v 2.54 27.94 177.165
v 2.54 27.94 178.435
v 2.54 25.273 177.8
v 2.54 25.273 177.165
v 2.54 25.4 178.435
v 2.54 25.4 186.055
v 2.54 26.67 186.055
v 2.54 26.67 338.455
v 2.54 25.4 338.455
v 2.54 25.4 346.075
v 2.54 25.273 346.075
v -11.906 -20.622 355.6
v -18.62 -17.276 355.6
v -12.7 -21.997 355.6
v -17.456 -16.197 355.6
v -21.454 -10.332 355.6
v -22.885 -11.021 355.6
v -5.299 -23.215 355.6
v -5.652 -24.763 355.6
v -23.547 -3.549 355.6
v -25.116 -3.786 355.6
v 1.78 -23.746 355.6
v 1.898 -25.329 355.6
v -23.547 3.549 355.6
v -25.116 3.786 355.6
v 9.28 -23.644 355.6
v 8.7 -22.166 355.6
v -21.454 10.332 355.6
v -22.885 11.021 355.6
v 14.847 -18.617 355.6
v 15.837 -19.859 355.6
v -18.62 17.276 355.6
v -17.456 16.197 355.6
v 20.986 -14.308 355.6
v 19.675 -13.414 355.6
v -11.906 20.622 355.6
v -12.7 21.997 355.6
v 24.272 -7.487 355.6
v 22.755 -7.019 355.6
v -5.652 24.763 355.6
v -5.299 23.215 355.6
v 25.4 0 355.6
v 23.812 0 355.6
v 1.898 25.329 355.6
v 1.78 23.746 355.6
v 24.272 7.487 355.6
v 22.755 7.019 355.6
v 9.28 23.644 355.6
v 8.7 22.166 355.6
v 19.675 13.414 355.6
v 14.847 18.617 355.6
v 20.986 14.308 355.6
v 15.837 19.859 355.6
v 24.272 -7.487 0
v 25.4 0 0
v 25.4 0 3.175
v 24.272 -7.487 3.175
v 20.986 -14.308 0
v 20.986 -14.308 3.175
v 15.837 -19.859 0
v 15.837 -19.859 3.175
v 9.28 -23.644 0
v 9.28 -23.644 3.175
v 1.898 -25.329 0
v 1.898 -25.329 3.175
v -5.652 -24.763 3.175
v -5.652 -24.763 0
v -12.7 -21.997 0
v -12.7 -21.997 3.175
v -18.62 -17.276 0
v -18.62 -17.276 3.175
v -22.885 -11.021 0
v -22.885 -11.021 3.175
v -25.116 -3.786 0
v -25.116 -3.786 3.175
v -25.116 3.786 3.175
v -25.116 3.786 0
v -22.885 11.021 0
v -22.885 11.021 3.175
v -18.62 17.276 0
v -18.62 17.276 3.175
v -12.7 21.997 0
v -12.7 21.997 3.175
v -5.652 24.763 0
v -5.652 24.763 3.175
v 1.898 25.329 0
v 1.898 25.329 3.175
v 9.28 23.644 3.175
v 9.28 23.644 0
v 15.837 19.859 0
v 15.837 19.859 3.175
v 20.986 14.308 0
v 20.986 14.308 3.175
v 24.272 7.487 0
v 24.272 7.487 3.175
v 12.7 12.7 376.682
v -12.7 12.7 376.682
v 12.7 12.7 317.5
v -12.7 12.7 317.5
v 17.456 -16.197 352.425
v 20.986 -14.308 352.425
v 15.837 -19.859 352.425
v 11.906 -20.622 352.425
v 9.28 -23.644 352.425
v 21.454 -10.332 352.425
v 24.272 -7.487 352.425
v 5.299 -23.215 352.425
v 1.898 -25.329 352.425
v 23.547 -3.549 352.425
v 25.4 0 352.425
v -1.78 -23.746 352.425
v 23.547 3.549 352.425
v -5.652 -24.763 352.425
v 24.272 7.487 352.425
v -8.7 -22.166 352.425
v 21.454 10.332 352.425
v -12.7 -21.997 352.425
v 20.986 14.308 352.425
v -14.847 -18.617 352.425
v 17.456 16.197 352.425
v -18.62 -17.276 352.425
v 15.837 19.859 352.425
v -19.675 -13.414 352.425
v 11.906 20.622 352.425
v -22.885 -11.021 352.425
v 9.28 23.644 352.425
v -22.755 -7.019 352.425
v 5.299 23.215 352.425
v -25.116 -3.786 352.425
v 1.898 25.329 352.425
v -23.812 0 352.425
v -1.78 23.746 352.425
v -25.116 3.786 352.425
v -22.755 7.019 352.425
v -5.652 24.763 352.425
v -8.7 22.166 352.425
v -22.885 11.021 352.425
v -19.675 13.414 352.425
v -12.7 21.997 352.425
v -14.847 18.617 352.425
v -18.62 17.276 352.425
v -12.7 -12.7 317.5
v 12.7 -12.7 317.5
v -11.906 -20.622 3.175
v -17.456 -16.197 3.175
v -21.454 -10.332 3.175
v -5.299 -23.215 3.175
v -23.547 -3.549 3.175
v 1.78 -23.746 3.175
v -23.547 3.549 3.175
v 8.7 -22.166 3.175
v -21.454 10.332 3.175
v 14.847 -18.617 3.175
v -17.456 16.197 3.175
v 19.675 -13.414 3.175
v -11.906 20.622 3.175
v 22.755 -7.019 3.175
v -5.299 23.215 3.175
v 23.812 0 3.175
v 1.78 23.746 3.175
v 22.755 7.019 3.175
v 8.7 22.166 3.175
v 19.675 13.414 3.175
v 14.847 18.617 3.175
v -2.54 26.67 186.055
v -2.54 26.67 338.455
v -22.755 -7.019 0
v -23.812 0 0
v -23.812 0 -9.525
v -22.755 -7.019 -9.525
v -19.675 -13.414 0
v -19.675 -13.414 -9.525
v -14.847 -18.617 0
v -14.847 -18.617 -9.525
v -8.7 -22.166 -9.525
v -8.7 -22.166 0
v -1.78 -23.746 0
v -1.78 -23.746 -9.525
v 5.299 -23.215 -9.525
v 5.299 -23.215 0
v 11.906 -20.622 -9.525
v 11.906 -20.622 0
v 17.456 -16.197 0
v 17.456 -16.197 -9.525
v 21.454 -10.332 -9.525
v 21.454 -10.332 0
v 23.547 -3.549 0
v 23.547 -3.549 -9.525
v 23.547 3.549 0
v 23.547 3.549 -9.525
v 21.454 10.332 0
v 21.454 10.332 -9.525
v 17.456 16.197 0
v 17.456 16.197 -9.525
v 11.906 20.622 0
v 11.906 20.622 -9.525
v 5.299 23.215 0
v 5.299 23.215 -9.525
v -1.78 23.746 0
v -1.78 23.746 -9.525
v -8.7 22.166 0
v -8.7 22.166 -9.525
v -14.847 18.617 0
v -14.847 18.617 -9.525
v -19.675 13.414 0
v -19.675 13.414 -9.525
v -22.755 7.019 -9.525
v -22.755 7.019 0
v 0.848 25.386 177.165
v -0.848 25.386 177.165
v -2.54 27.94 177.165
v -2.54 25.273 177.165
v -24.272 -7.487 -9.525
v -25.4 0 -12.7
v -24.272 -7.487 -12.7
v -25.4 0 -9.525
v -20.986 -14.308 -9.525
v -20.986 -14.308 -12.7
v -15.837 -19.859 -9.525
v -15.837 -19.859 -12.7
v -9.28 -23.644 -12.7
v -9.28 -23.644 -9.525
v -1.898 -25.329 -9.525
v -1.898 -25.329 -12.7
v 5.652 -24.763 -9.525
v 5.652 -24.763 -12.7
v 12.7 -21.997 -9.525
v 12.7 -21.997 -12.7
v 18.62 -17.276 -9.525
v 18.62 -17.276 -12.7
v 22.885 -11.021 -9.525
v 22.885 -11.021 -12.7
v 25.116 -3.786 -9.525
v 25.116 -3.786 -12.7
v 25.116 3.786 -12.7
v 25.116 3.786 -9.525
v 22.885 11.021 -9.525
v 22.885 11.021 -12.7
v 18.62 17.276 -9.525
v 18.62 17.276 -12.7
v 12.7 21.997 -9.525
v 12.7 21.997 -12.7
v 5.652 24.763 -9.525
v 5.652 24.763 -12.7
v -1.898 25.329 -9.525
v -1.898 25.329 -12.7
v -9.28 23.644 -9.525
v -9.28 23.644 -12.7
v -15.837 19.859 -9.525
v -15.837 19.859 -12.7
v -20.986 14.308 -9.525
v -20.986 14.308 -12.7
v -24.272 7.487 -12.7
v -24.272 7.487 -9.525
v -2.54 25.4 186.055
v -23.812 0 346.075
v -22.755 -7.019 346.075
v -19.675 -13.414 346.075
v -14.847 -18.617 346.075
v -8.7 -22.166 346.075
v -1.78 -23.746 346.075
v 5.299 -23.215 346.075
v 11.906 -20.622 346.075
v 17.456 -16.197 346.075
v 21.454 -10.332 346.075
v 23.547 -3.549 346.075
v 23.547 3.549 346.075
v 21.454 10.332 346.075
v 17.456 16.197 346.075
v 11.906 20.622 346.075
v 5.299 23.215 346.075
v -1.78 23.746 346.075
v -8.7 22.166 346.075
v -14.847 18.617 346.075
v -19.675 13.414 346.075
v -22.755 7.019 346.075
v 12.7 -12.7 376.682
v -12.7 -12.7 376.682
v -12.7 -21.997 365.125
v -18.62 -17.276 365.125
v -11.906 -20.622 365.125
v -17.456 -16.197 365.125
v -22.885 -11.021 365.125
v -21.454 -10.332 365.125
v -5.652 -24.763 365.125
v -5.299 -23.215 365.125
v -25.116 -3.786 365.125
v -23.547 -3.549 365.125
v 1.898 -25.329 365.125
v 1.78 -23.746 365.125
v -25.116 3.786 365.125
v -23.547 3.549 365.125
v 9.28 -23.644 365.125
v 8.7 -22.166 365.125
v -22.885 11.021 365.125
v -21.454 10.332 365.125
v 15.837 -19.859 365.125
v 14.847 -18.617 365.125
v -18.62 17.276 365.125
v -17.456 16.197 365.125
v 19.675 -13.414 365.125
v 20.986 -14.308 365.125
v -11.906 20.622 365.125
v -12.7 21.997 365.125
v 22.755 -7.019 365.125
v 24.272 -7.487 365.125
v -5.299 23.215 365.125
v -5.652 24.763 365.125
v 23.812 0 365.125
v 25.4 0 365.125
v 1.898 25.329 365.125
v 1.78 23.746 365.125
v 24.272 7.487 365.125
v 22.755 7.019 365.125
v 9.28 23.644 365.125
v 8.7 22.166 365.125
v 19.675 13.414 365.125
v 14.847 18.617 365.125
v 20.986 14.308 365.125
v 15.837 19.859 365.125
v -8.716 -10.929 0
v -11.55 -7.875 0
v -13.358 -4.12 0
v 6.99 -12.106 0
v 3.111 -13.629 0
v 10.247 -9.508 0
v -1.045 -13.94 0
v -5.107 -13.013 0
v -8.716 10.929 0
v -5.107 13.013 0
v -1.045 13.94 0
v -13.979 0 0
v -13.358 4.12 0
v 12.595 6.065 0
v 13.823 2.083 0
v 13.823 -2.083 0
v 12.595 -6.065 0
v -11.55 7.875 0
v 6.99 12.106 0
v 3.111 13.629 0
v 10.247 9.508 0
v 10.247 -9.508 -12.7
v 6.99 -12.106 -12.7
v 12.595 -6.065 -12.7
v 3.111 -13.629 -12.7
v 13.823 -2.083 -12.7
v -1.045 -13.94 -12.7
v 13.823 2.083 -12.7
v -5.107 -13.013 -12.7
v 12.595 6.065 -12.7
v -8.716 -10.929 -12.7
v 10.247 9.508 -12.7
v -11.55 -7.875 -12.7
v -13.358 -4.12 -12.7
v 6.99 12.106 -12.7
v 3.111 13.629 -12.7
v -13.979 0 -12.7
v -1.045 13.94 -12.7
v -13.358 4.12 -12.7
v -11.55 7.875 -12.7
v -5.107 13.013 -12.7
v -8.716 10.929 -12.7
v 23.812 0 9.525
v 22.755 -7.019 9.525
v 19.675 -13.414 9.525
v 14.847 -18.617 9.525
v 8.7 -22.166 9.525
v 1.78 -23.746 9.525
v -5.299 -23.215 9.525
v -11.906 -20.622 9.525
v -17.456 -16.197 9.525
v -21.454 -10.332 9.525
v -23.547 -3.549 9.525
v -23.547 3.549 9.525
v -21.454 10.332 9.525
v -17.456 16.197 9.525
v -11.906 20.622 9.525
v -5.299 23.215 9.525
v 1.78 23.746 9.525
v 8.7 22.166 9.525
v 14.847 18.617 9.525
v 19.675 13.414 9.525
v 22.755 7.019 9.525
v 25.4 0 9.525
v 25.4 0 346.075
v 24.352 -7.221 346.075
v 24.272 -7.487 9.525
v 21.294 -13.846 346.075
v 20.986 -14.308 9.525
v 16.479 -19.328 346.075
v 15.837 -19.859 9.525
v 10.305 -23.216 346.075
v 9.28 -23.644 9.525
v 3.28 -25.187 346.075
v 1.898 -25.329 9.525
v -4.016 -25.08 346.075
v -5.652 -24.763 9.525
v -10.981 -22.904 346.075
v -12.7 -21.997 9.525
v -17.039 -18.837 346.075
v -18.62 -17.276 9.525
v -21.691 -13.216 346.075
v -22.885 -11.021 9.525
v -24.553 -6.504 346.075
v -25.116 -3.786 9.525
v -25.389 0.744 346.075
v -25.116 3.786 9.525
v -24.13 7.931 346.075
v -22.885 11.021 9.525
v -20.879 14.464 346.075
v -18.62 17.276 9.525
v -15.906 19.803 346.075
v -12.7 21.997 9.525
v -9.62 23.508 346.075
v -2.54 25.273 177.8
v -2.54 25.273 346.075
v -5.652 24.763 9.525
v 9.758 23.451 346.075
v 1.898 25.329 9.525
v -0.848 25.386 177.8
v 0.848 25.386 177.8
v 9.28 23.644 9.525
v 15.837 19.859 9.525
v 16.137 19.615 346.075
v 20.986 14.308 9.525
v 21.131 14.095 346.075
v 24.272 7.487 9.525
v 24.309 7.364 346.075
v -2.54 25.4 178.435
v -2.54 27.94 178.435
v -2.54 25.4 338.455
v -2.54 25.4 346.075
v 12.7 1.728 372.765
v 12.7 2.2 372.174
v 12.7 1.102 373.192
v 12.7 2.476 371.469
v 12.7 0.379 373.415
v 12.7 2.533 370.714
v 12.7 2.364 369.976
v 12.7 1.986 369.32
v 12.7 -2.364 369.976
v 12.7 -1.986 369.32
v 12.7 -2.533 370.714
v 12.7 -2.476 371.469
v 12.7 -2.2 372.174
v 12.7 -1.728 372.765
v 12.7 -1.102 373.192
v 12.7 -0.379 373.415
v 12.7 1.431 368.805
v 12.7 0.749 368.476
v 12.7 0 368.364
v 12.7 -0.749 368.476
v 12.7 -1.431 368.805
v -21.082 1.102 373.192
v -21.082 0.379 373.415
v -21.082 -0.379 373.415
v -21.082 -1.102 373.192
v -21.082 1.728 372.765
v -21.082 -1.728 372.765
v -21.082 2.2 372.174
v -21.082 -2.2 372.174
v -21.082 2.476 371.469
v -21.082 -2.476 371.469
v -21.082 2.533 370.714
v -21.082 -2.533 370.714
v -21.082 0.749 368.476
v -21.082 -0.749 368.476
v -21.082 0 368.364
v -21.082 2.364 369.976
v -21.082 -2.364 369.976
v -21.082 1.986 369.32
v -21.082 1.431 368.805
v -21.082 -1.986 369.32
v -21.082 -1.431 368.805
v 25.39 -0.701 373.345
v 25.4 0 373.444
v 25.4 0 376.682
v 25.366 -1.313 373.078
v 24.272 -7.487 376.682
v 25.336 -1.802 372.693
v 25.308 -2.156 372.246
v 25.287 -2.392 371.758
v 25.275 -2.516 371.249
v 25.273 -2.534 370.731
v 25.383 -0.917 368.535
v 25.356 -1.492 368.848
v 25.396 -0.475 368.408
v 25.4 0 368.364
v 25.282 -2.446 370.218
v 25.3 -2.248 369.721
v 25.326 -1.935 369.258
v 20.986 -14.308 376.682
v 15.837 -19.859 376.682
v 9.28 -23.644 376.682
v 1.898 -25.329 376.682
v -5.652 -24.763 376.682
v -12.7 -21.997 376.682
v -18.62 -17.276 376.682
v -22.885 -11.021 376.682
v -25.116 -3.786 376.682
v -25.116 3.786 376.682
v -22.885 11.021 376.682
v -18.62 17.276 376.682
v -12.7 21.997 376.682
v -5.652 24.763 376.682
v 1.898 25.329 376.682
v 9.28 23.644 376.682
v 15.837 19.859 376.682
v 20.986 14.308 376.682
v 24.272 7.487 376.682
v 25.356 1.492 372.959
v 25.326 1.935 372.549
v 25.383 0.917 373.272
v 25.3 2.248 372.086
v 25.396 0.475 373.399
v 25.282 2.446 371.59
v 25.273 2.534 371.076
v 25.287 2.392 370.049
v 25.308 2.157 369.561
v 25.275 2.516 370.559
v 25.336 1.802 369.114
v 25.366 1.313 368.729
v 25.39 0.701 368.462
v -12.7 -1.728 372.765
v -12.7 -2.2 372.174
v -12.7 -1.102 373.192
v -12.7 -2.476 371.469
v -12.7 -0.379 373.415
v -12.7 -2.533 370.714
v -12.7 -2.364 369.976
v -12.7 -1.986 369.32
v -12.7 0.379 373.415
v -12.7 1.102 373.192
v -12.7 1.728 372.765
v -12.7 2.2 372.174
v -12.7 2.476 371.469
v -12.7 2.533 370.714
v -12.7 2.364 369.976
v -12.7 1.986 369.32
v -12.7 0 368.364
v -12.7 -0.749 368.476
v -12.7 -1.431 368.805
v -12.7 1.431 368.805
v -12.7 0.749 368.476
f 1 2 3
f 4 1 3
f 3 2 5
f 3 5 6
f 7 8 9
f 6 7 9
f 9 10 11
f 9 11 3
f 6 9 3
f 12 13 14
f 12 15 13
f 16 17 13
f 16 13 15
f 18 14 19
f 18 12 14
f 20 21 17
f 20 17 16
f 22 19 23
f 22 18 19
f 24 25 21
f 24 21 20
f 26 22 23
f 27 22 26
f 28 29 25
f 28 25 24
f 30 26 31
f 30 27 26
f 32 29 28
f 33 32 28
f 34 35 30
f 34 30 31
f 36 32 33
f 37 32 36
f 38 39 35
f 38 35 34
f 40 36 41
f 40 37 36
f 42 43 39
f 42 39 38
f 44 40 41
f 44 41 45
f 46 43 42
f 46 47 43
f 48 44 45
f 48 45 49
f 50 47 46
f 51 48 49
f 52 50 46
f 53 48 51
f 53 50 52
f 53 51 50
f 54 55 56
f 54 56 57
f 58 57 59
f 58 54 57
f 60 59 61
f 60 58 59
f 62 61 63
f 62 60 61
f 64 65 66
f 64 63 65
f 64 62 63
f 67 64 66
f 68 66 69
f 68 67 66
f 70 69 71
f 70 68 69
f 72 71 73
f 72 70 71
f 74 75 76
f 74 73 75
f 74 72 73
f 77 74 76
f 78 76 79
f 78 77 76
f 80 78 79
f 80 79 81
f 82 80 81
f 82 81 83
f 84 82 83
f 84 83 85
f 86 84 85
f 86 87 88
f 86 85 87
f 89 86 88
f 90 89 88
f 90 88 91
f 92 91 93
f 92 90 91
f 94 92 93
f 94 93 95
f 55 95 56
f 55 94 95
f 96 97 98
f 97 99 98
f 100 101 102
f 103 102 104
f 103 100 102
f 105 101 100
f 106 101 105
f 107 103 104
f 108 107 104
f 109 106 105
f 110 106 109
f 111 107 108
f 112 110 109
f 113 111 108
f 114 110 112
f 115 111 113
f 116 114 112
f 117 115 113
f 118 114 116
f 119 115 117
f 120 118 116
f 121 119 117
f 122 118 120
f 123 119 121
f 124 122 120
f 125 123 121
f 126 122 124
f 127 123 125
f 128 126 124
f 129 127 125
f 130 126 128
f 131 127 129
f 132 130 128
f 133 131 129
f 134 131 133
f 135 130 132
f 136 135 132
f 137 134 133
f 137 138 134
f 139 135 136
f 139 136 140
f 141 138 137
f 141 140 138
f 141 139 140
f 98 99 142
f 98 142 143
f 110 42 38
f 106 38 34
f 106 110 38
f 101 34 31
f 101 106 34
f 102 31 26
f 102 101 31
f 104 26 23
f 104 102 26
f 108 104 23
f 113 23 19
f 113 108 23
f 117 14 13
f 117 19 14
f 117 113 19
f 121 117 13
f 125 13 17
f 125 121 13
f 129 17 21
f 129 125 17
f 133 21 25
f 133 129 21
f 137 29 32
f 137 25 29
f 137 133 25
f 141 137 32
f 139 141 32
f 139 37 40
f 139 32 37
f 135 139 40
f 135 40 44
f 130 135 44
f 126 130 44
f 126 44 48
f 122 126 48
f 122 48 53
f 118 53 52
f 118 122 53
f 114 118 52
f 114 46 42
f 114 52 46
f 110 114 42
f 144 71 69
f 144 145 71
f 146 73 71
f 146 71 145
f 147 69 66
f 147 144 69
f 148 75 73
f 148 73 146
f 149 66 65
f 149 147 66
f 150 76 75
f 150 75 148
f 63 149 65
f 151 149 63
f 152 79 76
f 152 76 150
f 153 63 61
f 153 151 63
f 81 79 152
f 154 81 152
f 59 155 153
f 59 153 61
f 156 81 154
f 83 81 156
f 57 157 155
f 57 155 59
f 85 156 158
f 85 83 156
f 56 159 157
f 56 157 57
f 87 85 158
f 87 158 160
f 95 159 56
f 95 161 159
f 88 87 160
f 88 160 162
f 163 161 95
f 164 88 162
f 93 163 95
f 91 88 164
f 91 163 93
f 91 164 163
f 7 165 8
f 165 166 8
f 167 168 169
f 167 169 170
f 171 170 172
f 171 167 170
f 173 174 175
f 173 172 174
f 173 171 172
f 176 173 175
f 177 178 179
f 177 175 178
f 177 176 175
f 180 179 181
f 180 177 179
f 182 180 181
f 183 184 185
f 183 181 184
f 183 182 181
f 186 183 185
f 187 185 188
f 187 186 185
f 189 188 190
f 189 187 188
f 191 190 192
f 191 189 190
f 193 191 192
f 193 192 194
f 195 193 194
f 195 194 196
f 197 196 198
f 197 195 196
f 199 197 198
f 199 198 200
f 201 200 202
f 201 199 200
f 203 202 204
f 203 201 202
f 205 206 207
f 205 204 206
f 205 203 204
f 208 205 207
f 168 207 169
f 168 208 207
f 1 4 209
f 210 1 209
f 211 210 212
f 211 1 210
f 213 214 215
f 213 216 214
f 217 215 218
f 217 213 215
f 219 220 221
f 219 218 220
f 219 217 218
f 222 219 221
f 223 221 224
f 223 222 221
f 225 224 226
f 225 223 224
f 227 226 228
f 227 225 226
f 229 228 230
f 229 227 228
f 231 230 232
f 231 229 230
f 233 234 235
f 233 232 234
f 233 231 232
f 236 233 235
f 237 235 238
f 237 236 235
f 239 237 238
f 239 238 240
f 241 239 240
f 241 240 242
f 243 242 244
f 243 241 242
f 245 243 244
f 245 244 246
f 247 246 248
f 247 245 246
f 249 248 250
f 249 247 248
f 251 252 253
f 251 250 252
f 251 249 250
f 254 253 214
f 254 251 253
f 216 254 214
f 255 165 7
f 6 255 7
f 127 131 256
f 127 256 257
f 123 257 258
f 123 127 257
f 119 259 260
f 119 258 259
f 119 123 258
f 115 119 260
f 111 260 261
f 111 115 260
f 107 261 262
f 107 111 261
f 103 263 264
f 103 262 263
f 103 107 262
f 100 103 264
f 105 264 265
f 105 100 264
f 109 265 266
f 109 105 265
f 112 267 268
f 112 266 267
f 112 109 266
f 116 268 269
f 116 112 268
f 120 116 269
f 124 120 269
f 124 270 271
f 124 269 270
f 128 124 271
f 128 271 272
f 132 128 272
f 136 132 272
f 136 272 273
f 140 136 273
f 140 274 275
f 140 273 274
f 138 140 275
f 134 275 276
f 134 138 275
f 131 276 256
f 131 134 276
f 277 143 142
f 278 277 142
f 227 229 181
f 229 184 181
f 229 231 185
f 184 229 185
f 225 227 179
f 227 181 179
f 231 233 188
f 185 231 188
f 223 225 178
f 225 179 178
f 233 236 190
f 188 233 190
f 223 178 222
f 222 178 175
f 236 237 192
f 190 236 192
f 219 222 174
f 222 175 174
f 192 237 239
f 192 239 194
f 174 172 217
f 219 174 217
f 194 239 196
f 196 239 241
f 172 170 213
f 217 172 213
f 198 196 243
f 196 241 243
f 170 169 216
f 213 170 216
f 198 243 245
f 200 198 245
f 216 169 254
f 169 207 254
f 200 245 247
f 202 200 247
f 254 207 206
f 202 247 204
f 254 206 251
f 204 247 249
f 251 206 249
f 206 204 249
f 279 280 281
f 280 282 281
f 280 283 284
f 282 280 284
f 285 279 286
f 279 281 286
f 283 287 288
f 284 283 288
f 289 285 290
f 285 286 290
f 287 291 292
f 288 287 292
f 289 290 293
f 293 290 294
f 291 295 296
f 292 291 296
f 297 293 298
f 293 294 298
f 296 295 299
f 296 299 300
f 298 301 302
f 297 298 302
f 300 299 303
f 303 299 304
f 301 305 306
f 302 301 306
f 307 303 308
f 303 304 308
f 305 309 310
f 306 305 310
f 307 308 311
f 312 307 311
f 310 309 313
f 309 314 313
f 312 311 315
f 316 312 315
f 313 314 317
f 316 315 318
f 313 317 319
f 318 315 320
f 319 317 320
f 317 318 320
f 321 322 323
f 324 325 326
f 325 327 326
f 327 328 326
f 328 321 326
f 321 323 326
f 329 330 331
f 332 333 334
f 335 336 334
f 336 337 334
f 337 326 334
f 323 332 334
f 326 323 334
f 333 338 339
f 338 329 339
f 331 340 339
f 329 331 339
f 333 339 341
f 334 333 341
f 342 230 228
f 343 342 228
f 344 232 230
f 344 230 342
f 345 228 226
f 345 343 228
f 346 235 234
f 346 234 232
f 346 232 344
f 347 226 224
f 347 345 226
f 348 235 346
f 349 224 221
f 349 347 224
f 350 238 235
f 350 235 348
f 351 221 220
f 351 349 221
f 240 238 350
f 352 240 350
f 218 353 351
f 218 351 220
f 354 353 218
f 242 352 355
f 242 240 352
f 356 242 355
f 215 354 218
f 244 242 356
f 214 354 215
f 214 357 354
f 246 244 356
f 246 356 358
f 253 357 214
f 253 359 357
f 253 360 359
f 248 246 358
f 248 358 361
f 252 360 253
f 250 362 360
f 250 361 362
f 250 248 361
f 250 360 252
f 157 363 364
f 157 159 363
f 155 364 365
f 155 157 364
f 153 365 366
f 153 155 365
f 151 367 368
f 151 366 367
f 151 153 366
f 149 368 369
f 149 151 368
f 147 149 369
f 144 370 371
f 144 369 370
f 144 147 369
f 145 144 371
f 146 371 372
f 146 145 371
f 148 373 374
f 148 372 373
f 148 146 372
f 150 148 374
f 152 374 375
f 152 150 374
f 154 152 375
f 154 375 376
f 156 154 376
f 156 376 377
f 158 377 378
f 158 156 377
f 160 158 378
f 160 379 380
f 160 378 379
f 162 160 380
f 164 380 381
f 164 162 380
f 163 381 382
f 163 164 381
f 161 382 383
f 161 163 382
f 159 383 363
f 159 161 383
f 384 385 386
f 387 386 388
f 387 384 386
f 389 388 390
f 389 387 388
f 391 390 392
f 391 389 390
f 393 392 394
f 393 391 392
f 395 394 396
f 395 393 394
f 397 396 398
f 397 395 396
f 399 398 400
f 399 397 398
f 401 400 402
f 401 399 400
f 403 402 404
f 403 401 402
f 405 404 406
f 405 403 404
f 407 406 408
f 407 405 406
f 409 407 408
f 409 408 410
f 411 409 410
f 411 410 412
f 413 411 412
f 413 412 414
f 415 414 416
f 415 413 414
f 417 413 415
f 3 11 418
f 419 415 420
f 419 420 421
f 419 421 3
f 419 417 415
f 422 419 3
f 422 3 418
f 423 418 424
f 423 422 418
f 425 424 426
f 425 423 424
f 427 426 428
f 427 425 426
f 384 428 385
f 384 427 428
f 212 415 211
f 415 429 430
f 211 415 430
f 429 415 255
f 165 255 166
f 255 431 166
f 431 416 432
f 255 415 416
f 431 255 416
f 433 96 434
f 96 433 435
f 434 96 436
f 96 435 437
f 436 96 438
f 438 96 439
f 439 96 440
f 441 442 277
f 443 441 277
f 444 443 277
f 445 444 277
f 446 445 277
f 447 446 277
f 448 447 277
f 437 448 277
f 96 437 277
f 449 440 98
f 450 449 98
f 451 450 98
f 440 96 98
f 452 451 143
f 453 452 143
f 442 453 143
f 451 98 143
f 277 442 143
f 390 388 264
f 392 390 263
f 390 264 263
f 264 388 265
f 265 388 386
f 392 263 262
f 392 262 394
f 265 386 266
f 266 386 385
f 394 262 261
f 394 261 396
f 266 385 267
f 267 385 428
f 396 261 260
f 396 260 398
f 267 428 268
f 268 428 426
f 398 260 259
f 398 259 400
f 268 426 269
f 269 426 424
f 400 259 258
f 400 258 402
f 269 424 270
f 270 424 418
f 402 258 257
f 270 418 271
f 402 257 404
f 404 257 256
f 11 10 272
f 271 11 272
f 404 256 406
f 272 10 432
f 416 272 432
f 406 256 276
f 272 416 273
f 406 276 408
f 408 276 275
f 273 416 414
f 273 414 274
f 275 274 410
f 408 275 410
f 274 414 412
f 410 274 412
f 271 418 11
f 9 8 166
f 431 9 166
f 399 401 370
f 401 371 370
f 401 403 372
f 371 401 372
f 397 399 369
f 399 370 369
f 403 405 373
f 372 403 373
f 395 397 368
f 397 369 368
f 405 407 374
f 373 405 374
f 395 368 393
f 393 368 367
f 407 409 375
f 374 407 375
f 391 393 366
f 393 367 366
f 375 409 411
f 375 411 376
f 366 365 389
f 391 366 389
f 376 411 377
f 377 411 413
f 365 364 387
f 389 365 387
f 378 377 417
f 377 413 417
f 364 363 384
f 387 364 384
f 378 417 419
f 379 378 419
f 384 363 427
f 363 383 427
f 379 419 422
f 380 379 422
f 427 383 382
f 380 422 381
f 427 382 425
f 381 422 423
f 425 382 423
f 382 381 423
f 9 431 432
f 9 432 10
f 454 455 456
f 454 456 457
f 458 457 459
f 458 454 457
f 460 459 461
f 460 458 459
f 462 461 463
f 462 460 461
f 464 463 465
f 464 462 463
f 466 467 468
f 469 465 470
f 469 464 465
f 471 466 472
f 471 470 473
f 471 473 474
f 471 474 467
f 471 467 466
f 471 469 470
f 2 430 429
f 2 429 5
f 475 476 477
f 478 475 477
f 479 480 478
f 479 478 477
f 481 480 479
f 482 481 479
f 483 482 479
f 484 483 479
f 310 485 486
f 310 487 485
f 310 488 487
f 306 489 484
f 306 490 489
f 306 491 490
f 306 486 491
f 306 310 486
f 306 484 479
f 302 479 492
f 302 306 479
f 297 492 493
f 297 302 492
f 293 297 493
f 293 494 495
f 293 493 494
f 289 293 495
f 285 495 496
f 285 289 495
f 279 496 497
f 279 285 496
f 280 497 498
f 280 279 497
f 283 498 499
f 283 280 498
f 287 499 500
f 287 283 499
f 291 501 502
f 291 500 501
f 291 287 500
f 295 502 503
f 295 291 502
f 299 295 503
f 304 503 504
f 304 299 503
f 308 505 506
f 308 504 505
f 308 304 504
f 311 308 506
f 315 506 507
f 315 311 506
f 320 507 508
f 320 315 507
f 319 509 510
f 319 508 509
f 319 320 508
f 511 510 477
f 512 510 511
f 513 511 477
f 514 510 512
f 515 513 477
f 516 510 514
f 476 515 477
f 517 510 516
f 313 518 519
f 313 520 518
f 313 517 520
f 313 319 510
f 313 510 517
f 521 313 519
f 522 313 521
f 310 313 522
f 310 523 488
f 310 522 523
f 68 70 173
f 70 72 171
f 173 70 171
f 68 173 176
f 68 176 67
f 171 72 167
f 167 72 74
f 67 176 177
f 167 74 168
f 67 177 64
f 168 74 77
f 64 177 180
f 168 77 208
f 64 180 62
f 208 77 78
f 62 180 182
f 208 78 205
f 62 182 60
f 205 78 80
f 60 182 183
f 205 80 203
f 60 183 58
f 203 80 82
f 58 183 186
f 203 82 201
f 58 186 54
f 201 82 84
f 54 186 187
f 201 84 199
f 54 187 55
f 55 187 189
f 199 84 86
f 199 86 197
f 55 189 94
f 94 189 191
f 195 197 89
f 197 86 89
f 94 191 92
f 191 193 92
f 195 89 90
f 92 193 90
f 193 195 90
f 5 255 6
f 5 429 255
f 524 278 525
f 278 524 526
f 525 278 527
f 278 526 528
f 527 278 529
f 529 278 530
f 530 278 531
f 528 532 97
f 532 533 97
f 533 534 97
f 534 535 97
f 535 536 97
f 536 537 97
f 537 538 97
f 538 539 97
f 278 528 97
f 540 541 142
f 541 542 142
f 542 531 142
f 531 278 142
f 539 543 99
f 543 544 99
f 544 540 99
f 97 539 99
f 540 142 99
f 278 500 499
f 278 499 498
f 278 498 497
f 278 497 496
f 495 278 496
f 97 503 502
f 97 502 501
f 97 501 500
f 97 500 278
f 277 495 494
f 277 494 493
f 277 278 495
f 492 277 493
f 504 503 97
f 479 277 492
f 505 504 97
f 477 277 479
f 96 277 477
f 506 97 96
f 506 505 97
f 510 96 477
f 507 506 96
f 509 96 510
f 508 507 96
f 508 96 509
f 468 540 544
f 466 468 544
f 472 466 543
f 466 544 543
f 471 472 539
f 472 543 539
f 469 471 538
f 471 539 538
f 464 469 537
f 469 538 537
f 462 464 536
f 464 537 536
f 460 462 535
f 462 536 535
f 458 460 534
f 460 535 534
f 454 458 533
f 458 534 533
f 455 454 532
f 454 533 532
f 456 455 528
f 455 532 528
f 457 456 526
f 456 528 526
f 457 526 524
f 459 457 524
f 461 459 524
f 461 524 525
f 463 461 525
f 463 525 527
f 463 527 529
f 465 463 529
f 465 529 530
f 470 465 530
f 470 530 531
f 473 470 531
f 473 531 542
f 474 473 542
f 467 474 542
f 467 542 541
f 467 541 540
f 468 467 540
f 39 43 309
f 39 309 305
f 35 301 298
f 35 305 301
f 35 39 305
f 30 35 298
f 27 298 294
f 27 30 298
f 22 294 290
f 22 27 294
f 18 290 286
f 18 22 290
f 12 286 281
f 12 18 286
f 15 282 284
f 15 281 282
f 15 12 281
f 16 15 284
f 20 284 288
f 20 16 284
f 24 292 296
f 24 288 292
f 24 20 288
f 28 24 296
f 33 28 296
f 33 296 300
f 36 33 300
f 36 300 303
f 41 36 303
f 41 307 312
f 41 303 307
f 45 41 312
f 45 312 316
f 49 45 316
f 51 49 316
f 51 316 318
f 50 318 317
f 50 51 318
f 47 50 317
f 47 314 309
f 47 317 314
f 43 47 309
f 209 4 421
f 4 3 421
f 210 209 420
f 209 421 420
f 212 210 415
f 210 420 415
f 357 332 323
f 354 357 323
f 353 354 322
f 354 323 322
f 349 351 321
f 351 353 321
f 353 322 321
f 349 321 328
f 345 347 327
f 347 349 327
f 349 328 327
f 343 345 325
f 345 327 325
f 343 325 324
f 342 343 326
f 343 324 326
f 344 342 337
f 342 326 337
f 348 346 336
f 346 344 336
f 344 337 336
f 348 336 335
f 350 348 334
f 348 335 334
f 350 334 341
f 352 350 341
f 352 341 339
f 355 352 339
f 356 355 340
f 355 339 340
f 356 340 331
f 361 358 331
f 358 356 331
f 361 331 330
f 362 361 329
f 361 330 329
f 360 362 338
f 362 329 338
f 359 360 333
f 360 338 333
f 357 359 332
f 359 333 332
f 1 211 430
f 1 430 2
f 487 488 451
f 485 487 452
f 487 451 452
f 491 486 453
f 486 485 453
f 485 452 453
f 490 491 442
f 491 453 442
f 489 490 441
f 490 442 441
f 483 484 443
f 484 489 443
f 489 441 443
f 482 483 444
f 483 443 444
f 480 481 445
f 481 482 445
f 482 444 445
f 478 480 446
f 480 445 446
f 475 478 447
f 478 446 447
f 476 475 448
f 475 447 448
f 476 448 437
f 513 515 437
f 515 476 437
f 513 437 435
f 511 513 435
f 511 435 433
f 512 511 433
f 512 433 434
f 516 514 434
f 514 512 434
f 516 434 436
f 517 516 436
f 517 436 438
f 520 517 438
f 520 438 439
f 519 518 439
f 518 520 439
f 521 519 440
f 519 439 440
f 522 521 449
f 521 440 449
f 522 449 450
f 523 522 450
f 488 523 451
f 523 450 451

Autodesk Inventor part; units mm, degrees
ref_plane "YZ Plane" through (0, 0, 0) normal (1, 0, 0) x (0, 1, 0)
ref_plane "XZ Plane" through (0, 0, 0) normal (0, 1, 0) x (-1, 0, 0)
ref_plane "XY Plane" through (0, 0, 0) normal (0, 0, 1) x (1, 0, 0)
sketch "Sketch1" plane through (0, 0, 0) normal (0, 0, 1) x (1, 0, 0)
  circle A0 centre (0, 0) radius 25.4
  dimension "d0" = 50.8
extrude "Extrusion1" add sketch "Sketch1" along normal blind 355.6
sketch "Sketch4" plane through (0, 0, 355.6) normal (0, 0, 1) x (1, 0, 0)
  line L0 (31.0854, 16.4706) -> (47.788, 16.4706)
  line L1 (47.788, 16.4706) -> (47.788, 0)
  line L2 (47.788, 0) -> (31.0854, 0)
  line L3 (31.0854, 0) -> (31.0854, 16.4706)
  point P0 (0, 0)
extrude "Extrusion4" add sketch "Sketch4" against normal blind 3.175
sketch "Sketch5" plane through (0, 0, 352.425) normal (0, 0, -1) x (-1, 0, 0)
  circle A0 centre (0, 0) radius 25.4
  circle A1 centre (0, 0) radius 23.8125
  dimension "d19" = 1.5875
extrude "Extrusion5" cut sketch "Sketch5" along normal blind 6.35
sketch "Sketch6" plane through (0, 0, 0) normal (0, 0, -1) x (-1, 0, 0)
  line L0 (29.0417, -43.641) -> (10.5178, -43.641)
  line L1 (10.5178, -43.641) -> (10.5178, -69.3861)
  line L2 (10.5178, -69.3861) -> (29.0417, -69.3861)
  line L3 (29.0417, -69.3861) -> (29.0417, -43.641)
  point P0 (0, 0)
extrude "Extrusion6" add sketch "Sketch6" against normal blind 3.175
sketch "Sketch7" plane through (0, 0, 3.175) normal (0, 0, 1) x (1, 0, 0)
  circle A0 centre (0, 0) radius 25.4
  circle A1 centre (0, 0) radius 23.8125
extrude "Extrusion7" cut sketch "Sketch7" along normal blind 6.35
sketch "Sketch8" plane through (-29.0417, -69.3861, 0) normal (-1, 0, 0) x (0, 0, 1)
  line L0 (0, 0) -> (0, 25.7451) projected
  line L1 (3.175, 25.7451) -> (3.175, 0) projected
  line L2 (0, 0) -> (3.175, 0)
  line L3 (3.175, 0) -> (3.175, 25.7451)
  line L4 (3.175, 25.7451) -> (0, 25.7451)
  line L5 (0, 25.7451) -> (0, 0)
  point P0 (0, 69.3861)
extrude "Extrusion8" cut sketch "Sketch8" against normal through all
sketch "Sketch9" plane through (0, 0, 355.6) normal (0, 0, 1) x (1, 0, 0)
  line L0 (31.0854, 16.4706) -> (47.788, 16.4706) projected
  line L1 (31.0854, 16.4706) -> (47.788, 16.4706)
  line L2 (47.788, 16.4706) -> (47.788, 0)
  line L3 (47.788, 0) -> (31.0854, 0)
  line L4 (31.0854, 0) -> (31.0854, 16.4706)
  point P0 (0, 0)
extrude "Extrusion9" cut sketch "Sketch9" against normal blind 6.35
sketch "Sketch10" plane through (0, 0, 346.075) normal (0, 0, 1) x (1, 0, 0)
  circle A0 centre (0, 0) radius 25.4 projected
  line L0 (2.54, 25.4) -> (2.54, 26.67)
  line L1 (2.54, 26.67) -> (0, 26.67)
  line L2 (0, 26.67) -> (0, 25.4)
  line L3 (-2.54, 25.4) -> (-2.54, 26.67)
  line L4 (-2.54, 26.67) -> (0, 26.67)
  line L5 (0, 26.67) -> (0, 25.4)
  arc A1 (2.54, 25.2727) -> (-2.54, 25.2727) centre (0, 0) ccw
  line L6 (2.54, 25.4) -> (2.54, 25.2727)
  line L7 (-2.54, 25.4) -> (-2.54, 25.2727)
  dimension "d30" = 2.54
  dimension "d31" = 1.27
  dimension "d32" = 2.54
  dimension "d33" = 1.27
extrude "Extrusion10" add sketch "Sketch10" against normal blind 168.275 contours A0 L2 L1 L0 L6 | L7 L3 L4 L2 A0
sketch "Sketch11" plane through (-2.54, 26.67, 346.075) normal (0, 1, 0) x (1, 0, 0)
  line L0 (5.08, 168.275) -> (0, 168.275) projected
  line L1 (0, 0) -> (0, 168.275) projected
  line L2 (5.08, 168.275) -> (0, 168.275)
  line L3 (0, 168.275) -> (0, 167.64)
  line L4 (0, 167.64) -> (5.08, 167.64)
  line L5 (5.08, 167.64) -> (5.08, 168.275)
  line L6 (5.08, 168.275) -> (0, 168.275)
  line L7 (0, 168.275) -> (0, 168.91)
  line L8 (0, 168.91) -> (5.08, 168.91)
  line L9 (5.08, 168.91) -> (5.08, 168.275)
  point P0 (2.54, 346.075)
  dimension "d36" = 0.635
  dimension "d37" = 0.635
sketch "Sketch12" plane through (0, 0, 177.8) normal (0, 0, -1) x (-1, 0, 0)
  line L0 (2.54, 26.67) -> (-2.54, 26.67) projected
  line L1 (-2.54, 26.67) -> (-2.54, 25.2727)
  line L2 (-2.54, 25.2727) -> (2.54, 25.2727)
  line L3 (2.54, 25.2727) -> (2.54, 26.67) projected
  line L4 (2.54, 26.67) -> (2.54, 25.2727)
  line L5 (-2.54, 26.67) -> (2.54, 26.67)
  arc A0 (2.54, 25.2727) -> (-2.54, 25.2727) centre (0, 0) ccw
  arc A1 (-2.54, 25.2727) -> (2.54, 25.2727) centre (0, 0) ccw projected
  arc A2 (2.54, 25.2727) -> (-2.54, 25.2727) centre (0, 0) ccw
extrude "Extrusion11" add sketch "Sketch12" along normal blind 0.635 contours L3 A0 L1 L0
extrude "Extrusion12" add sketch "Sketch11" along normal blind 1.27
sketch "Sketch13" plane through (0, 0, 355.6) normal (0, 0, 1) x (1, 0, 0)
  line L0 (13.9466, 0.955) -> (12.6912, 0.4731) projected
  line L1 (13.8404, 1.9655) -> (13.9466, 0.955) projected
  circle A0 centre (0, 0) radius 13.9792
  circle A1 centre (0, 0) radius 25.4
  circle A2 centre (0, 0) radius 23.8125 projected
  circle A3 centre (0, 0) radius 23.8125
extrude "Extrusion13" add sketch "Sketch13" along normal blind 9.525 contours A2
sketch "Sketch14" plane through (0, 0, 365.125) normal (0, 0, 1) x (1, 0, 0)
  circle A0 centre (0, 0) radius 25.4
  arc A1 (13.9792, 0) -> (13.9792, 0) centre (0, 0) ccw projected
  circle A2 centre (0, 0) radius 13.9792
extrude "Extrusion14" add sketch "Sketch14" along normal blind 3.175
sketch "Sketch16" plane through (0, 0, 0) normal (0, 0, -1) x (-1, 0, 0)
  circle A0 centre (0, 0) radius 23.8125
  circle A1 centre (0, 0) radius 13.9792
  point P0 (-13.9792, 0)
  point P1 (-13.9792, 0)
extrude "Extrusion15" add sketch "Sketch16" along normal blind 9.525
sketch "Sketch17" plane through (0, 0, -9.525) normal (0, 0, -1) x (-1, 0, 0)
  circle A0 centre (0, 0) radius 25.4
  line L0 (8.8437, -9.1148) -> (9.2337, -9.3135) projected
  circle A1 centre (0, 0) radius 13.9792
  point P0 (13.9792, 0)
extrude "Extrusion16" add sketch "Sketch17" along normal blind 3.175
sketch "Sketch18" plane through (-2.54, 26.67, 346.075) normal (0, 1, 0) x (1, 0, 0)
  line L0 (5.08, 168.91) -> (5.08, 0) projected
  line L1 (0, 0) -> (5.08, 0)
  line L2 (5.08, 0) -> (5.08, 7.62)
  line L3 (5.08, 7.62) -> (0, 7.62)
  line L4 (0, 7.62) -> (0, 0)
  line L5 (0, 167.64) -> (5.08, 167.64) projected
  line L6 (0, 0) -> (0, 168.91) projected
  line L7 (5.08, 167.64) -> (0, 167.64)
  line L8 (0, 167.64) -> (0, 160.02)
  line L9 (0, 160.02) -> (5.08, 160.02)
  line L10 (5.08, 160.02) -> (5.08, 167.64)
  point P0 (2.54, 346.075)
  dimension "d50" = 7.62
  dimension "d51" = 7.62
extrude "Extrusion17" cut sketch "Sketch18" against normal blind 1.27 contours L0 L9 L6 L5 | L0 L1 L4 L3
sketch "Sketch19" plane through (0, 0, 368.3) normal (0, 0, 1) x (1, 0, 0)
  circle A0 centre (0, 0) radius 15.0616
extrude "Extrusion18" add sketch "Sketch19" against normal blind 25.4
sketch "Sketch20" plane through (0, 0, 368.3) normal (0, 0, 1) x (1, 0, 0)
  line L0 (0, 0) -> (-25.4, 0)
  circle A0 centre (0, 0) radius 25.4 projected
  arc A1 (-12.6912, 0.4731) -> (-12.6912, -0.4731) centre (0, 0) ccw projected
  line L1 (-12.7, 0) -> (-12.7, 12.7)
  line L2 (-12.7, 12.7) -> (12.7, 12.7)
  line L3 (12.7, 12.7) -> (12.7, -12.7)
  line L4 (12.7, -12.7) -> (-12.7, -12.7)
  line L5 (-12.7, -12.7) -> (-12.7, 0)
  dimension "d56" = 12.7
  dimension "d57" = 25.4
  dimension "d58" = 25.4
  dimension "d59" = 25.4
extrude "Extrusion19" cut sketch "Sketch20" against normal blind 50.8 contours L1 L2 L3 L4 L5
sketch "Sketch24" plane through (0, 0, 368.3) normal (0, 0, 1) x (1, 0, 0)
  circle A0 centre (0, 0) radius 25.4
  line L0 (12.7, 12.7) -> (12.7, -12.7) projected
  line L1 (-12.7, -12.7) -> (-12.7, 12.7) projected
  line L2 (12.7, -12.7) -> (-12.7, -12.7)
  line L3 (-12.7, -12.7) -> (-12.7, 12.7)
  line L4 (-12.7, 12.7) -> (12.7, 12.7)
  line L5 (12.7, 12.7) -> (12.7, -12.7)
extrude "Extrusion24" add sketch "Sketch24" along normal blind 8.382
sketch "Sketch25" plane through (-12.7, -12.7, 317.5) normal (1, 0, 0) x (0, 0, -1)
  line L0 (-47.625, 38.1) -> (-59.182, 38.1) projected
  line L1 (-53.4035, 38.1) -> (-53.4035, -12.7)
  line L2 (-47.625, -12.7) -> (-59.182, -12.7) projected
  circle A0 centre (-53.4035, 12.7) radius 2.54
  point P0 (317.5, 12.7)
  dimension "d73" = 5.08
extrude "Extrusion25" cut sketch "Sketch25" against normal blind 8.382
extrude "Extrusion26" cut sketch "Sketch25" along normal blind 50.8
sketch "Sketch26" plane through (-12.7, -12.7, 317.5) normal (1, 0, 0) x (0, 0, -1)
  point P0 (317.5, 12.7)
properties part number "Axel_SBail"
